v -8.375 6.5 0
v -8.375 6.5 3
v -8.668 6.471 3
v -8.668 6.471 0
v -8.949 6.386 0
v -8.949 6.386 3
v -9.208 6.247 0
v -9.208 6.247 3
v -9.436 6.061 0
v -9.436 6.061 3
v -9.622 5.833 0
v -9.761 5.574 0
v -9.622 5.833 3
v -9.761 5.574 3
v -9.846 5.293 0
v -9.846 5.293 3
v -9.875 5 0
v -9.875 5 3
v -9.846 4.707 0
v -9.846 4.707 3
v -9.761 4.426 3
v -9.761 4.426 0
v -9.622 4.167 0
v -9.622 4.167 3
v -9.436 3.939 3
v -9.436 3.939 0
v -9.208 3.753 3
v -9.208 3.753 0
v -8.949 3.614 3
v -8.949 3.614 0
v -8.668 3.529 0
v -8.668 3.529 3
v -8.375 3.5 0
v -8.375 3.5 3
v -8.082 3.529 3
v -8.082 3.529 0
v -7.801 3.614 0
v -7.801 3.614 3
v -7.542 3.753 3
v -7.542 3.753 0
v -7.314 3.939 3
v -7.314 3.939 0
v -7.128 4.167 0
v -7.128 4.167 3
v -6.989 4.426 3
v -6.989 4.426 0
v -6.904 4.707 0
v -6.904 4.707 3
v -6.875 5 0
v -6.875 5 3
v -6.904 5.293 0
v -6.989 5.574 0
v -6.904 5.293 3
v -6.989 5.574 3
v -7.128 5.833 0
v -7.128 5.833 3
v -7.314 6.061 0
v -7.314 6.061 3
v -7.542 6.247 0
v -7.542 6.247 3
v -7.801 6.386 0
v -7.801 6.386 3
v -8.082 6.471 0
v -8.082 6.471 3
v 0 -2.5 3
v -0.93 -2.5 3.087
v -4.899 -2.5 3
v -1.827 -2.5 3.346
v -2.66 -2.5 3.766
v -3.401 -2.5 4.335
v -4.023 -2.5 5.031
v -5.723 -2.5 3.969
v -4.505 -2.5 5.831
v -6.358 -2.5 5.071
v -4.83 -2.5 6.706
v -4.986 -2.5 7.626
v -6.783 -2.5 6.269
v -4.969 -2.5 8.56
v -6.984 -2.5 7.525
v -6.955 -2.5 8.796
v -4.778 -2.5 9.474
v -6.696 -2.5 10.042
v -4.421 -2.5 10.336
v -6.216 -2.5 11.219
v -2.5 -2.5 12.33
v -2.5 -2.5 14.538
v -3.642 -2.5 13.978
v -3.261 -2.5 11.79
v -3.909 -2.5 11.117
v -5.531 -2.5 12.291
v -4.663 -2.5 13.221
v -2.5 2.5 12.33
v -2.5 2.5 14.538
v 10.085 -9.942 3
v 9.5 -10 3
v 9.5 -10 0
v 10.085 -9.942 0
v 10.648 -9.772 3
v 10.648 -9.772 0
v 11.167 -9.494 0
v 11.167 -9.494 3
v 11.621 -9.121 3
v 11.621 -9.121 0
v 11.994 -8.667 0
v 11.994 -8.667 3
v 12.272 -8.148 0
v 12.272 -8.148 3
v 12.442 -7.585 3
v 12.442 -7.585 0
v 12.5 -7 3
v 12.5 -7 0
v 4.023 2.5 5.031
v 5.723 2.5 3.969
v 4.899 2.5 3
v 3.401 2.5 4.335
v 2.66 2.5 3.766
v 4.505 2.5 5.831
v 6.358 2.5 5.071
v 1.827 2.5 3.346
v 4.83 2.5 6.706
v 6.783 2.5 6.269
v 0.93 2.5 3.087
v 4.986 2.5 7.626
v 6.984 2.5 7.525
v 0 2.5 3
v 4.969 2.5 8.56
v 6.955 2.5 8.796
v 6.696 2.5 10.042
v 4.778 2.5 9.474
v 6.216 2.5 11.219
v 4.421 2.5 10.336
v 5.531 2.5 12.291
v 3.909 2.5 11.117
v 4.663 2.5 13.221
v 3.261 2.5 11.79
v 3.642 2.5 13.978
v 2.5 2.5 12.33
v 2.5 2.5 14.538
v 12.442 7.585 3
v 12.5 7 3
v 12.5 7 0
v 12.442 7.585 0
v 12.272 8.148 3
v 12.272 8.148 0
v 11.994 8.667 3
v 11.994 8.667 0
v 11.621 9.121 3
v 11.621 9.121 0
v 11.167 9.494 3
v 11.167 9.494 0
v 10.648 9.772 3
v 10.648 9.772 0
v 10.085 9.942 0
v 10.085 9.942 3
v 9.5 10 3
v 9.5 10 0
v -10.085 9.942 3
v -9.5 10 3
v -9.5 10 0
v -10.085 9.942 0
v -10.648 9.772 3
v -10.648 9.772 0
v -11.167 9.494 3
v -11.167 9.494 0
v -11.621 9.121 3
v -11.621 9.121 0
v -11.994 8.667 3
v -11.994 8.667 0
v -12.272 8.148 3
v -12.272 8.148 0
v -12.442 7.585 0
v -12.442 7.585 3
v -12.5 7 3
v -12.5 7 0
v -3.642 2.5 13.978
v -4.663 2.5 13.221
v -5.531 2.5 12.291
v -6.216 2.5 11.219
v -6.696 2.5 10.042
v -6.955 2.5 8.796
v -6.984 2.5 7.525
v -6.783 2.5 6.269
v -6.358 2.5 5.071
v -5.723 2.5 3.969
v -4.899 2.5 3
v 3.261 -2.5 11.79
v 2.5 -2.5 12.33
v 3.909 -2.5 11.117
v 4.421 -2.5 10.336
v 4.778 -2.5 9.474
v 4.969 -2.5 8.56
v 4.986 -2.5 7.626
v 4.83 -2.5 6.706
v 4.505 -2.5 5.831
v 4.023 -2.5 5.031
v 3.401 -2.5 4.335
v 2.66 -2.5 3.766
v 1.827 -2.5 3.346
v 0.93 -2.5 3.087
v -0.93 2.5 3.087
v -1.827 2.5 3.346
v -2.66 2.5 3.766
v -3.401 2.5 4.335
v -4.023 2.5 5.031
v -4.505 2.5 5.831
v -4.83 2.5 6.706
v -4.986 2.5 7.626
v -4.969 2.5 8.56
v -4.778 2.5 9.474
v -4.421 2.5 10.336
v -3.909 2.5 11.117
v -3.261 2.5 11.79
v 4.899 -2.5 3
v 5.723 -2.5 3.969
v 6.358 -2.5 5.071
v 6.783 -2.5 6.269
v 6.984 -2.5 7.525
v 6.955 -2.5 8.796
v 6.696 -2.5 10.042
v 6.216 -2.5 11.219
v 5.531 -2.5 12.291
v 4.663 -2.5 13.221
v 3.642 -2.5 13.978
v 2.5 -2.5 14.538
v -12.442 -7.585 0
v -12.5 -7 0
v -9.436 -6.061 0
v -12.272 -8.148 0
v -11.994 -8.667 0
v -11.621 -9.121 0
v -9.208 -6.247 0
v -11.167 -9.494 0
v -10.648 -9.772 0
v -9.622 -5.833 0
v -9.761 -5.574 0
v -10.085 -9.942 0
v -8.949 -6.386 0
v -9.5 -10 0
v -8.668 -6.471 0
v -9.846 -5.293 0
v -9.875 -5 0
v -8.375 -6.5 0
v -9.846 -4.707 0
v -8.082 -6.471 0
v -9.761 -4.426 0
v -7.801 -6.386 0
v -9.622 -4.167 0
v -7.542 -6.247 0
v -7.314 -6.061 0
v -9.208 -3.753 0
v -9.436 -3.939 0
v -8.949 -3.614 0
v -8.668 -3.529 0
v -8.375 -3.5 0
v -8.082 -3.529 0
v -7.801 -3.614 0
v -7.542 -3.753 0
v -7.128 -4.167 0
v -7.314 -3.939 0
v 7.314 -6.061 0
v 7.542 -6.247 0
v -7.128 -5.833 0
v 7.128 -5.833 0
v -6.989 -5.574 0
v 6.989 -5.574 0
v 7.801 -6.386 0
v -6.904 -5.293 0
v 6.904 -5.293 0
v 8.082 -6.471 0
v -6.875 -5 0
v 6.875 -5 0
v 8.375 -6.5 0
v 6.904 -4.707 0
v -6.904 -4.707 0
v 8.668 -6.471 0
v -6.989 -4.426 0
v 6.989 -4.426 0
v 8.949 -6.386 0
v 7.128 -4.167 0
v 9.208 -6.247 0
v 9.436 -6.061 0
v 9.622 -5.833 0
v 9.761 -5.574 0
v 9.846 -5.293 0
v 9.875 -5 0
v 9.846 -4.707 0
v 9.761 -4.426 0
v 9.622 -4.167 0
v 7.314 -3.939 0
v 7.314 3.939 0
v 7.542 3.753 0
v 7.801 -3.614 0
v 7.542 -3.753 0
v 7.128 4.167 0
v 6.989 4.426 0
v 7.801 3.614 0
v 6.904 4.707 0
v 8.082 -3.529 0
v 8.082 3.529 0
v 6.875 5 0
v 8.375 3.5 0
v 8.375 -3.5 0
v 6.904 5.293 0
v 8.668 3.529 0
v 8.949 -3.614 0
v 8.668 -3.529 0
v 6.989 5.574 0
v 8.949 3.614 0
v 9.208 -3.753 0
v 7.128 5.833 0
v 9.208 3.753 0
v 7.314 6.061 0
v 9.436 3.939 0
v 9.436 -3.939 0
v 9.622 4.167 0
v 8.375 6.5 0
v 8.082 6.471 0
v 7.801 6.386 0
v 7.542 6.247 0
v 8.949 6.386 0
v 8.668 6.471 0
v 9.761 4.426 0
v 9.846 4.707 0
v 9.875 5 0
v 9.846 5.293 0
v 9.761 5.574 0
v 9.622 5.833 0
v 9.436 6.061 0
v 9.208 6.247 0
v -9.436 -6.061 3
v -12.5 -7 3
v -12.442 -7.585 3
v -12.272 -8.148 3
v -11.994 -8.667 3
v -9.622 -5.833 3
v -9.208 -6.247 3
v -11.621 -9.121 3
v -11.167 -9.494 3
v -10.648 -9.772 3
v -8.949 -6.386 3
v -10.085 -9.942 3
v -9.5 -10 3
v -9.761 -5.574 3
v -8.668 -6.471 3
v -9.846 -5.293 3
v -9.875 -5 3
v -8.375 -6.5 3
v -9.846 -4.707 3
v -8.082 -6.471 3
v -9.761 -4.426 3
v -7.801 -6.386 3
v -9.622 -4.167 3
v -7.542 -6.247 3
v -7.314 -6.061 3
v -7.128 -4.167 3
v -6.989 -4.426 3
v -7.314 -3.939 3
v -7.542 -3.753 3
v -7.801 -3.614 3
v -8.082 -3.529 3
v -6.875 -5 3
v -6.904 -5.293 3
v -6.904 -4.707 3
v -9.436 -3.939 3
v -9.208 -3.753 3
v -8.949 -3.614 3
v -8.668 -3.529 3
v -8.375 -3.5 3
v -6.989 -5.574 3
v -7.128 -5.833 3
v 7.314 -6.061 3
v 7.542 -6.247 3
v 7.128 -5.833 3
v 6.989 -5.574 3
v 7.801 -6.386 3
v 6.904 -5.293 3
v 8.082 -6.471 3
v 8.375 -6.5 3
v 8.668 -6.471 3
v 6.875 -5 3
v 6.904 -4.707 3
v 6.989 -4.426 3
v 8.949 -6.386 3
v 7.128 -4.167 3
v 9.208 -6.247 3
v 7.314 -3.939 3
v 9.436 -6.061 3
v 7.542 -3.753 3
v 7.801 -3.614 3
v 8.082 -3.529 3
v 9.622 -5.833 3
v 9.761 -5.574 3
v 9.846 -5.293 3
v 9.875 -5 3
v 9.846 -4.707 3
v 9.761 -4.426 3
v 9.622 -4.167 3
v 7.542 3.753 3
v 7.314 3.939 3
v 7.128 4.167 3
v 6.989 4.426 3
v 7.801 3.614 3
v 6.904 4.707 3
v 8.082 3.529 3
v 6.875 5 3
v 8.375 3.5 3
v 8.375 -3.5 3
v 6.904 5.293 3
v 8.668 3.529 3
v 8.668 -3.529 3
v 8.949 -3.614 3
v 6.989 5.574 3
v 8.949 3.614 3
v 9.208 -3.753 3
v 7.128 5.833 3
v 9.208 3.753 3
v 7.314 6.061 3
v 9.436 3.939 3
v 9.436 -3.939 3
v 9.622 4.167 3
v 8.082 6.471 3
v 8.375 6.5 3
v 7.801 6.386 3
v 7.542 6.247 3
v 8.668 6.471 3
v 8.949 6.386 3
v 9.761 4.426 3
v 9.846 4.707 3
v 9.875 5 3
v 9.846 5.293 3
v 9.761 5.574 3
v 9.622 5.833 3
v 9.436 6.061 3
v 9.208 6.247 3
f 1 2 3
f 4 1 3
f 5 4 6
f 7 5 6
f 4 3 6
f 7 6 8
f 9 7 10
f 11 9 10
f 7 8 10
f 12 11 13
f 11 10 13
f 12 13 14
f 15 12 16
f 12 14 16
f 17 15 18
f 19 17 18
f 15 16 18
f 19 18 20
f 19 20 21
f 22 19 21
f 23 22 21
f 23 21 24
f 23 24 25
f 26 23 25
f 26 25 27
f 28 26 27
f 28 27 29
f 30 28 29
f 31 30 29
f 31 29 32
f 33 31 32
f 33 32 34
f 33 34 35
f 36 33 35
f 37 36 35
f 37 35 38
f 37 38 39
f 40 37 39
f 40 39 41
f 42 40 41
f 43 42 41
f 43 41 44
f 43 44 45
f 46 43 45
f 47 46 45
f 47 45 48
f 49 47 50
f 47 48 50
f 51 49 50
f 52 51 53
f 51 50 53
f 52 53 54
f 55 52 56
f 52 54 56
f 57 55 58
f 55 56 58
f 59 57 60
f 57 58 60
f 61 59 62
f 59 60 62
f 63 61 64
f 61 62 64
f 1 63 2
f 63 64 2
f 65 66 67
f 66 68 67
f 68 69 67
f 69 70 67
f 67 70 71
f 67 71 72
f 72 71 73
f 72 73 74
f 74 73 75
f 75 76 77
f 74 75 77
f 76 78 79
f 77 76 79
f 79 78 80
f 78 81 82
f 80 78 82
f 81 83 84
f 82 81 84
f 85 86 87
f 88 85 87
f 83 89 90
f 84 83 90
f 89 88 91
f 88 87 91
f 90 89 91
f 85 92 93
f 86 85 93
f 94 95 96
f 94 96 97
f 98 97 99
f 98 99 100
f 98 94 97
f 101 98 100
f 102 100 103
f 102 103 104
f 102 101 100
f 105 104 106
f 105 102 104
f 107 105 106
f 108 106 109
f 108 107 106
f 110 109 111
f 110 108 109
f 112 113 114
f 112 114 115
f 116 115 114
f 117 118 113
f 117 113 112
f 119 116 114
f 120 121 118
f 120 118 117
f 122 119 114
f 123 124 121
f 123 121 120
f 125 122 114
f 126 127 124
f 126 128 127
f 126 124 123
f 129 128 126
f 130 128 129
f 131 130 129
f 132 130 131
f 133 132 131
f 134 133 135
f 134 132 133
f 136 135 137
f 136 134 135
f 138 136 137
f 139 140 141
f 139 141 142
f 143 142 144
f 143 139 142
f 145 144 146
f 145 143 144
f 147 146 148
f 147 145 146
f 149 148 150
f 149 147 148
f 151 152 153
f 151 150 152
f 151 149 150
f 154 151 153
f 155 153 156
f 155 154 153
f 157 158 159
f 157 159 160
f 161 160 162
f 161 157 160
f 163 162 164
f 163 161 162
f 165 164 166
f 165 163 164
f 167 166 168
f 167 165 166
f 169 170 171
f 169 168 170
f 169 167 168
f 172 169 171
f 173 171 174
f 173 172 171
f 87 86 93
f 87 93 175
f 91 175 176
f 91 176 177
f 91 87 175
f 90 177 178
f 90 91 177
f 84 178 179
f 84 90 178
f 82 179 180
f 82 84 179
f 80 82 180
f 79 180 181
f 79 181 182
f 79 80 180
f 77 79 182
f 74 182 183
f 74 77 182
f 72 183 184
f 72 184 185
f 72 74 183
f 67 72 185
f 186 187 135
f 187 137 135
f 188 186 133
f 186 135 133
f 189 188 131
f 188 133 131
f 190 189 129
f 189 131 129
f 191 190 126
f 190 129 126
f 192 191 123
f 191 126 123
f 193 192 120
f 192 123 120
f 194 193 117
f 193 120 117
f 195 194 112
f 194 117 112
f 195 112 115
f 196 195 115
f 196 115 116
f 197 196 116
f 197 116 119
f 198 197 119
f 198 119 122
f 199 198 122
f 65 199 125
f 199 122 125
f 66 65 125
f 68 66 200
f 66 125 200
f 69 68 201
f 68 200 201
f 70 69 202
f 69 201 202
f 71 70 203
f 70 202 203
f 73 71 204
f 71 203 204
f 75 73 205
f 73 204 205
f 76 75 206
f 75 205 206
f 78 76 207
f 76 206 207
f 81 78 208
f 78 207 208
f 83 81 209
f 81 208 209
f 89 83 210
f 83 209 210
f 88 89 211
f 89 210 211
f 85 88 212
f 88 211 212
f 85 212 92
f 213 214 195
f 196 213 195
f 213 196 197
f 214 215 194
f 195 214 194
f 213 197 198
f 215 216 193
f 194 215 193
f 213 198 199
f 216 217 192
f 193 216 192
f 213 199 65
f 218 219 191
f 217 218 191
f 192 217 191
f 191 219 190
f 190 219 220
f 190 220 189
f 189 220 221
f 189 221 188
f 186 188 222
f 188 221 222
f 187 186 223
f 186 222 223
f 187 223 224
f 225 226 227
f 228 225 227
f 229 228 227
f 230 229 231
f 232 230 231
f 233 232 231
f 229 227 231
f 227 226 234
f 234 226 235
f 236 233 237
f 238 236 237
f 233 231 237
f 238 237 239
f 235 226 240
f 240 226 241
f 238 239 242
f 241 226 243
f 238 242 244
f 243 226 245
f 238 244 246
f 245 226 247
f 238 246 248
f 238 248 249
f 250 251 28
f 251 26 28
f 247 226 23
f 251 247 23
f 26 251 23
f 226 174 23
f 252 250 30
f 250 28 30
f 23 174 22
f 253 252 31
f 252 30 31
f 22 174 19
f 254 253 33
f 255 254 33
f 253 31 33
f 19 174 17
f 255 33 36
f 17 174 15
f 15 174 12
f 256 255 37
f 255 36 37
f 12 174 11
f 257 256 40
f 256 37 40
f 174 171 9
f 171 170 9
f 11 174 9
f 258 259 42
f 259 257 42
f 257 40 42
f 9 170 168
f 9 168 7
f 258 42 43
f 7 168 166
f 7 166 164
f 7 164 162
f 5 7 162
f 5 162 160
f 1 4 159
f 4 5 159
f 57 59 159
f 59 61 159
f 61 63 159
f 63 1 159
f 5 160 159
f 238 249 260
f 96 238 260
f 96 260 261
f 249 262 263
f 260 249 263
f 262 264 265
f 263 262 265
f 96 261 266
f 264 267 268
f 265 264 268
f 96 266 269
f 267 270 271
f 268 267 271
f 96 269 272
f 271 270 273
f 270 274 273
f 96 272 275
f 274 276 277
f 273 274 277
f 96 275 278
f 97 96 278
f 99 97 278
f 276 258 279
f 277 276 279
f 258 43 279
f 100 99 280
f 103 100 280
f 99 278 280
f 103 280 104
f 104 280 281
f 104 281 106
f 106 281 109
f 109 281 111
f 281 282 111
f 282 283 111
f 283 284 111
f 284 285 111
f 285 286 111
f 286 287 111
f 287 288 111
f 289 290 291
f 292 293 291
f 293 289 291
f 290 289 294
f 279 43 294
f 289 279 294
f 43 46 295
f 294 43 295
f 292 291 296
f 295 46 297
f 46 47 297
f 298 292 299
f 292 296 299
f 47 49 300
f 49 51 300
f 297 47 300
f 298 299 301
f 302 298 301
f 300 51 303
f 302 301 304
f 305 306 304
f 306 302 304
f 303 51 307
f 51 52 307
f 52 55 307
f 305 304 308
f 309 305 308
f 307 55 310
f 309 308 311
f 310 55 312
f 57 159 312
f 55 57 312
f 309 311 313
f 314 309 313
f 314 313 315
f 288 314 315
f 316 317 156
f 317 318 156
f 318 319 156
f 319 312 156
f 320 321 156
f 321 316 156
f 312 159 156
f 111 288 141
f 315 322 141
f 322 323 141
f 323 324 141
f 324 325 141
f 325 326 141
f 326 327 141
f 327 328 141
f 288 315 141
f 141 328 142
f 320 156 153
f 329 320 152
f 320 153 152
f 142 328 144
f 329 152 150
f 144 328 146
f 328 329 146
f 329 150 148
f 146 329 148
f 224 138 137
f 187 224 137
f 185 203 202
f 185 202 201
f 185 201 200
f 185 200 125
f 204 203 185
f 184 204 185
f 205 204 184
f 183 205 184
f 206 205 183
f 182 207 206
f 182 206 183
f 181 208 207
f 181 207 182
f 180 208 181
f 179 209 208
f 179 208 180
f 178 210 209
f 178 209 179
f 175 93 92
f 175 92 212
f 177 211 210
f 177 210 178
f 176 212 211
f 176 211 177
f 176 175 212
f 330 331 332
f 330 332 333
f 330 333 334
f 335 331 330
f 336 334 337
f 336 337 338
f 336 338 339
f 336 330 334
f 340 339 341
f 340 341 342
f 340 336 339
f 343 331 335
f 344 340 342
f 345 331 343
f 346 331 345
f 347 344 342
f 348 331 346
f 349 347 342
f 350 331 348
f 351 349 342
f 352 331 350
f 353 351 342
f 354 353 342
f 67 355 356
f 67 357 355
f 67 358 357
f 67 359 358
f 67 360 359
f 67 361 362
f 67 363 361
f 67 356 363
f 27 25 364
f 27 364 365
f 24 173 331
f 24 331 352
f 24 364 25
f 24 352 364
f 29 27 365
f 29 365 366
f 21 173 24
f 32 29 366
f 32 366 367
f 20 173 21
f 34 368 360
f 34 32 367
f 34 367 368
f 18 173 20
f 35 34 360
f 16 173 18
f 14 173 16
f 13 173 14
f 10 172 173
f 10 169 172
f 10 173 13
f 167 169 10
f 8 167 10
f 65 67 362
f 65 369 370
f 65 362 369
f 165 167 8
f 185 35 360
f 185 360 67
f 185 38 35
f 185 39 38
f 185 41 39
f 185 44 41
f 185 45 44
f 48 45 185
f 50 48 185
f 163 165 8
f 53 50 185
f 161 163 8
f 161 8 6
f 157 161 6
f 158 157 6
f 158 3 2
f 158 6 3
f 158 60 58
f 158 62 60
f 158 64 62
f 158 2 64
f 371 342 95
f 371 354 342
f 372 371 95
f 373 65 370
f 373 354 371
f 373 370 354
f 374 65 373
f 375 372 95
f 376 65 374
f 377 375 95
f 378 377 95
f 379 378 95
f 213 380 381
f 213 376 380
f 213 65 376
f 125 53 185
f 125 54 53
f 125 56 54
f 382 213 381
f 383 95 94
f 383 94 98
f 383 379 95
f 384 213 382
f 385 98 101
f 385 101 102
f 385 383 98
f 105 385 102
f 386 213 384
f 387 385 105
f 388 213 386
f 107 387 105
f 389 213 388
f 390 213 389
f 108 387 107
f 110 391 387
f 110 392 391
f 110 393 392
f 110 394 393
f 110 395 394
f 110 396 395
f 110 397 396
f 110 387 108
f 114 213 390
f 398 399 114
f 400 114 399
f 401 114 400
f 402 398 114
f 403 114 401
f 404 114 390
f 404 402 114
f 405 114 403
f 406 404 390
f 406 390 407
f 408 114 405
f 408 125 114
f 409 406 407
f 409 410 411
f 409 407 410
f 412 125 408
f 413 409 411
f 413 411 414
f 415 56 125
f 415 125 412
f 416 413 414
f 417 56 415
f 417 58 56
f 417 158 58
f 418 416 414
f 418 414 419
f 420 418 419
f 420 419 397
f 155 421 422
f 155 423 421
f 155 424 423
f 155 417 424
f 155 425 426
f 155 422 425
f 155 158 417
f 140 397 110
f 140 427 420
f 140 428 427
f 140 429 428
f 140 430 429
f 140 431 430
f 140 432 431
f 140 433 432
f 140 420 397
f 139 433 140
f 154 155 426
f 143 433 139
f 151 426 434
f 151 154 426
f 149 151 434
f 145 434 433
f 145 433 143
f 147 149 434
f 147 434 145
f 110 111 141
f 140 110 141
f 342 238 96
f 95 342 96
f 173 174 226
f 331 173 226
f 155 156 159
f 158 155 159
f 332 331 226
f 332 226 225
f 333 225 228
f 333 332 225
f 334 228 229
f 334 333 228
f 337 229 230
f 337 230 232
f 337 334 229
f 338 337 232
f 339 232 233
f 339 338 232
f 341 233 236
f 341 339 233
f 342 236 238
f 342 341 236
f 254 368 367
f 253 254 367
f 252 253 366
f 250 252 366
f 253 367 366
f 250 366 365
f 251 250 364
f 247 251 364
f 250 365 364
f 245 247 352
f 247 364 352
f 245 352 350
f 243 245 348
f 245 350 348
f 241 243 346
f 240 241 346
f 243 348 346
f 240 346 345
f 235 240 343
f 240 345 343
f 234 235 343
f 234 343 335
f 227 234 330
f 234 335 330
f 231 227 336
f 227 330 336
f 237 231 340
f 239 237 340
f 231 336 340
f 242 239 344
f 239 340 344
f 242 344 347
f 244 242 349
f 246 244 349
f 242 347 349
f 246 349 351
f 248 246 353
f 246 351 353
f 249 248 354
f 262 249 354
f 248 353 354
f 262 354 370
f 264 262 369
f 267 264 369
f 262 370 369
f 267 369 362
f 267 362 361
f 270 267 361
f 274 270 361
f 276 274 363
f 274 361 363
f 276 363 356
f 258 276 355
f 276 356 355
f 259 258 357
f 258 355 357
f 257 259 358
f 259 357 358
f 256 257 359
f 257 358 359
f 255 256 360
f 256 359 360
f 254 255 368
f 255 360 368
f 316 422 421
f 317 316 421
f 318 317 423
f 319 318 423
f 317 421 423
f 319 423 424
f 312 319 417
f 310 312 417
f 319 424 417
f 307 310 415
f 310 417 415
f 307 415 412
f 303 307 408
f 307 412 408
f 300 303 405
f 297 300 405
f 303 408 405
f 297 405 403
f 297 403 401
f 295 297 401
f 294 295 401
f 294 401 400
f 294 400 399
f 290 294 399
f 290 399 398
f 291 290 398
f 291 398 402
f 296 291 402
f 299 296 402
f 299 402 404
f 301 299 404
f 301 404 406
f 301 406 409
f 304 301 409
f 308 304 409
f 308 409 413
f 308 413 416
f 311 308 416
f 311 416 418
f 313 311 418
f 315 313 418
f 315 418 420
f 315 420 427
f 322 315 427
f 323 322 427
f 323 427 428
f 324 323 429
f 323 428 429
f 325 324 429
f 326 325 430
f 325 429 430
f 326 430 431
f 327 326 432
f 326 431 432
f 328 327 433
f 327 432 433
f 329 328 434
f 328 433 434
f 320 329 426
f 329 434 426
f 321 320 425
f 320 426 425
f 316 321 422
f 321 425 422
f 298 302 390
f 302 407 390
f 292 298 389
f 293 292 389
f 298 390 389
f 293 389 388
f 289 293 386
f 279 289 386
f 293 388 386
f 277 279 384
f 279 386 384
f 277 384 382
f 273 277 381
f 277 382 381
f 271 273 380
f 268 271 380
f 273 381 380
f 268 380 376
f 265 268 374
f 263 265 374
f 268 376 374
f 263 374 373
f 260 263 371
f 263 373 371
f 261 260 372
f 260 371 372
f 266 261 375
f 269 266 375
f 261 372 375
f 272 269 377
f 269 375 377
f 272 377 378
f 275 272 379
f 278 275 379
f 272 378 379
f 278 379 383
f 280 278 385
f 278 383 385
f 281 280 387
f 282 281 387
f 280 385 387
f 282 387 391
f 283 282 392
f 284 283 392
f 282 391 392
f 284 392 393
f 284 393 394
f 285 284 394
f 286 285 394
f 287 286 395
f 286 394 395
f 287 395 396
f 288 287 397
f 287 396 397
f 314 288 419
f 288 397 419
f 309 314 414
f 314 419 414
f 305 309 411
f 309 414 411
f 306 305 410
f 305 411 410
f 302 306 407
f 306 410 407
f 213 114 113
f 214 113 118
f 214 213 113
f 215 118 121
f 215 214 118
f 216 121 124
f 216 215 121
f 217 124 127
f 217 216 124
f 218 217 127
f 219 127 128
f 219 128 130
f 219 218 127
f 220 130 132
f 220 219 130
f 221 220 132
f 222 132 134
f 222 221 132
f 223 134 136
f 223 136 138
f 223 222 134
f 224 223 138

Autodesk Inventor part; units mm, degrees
ref_plane "YZ Plane" through (0, 0, 0) normal (1, 0, 0) x (0, 1, 0)
ref_plane "XZ Plane" through (0, 0, 0) normal (0, 1, 0) x (-1, 0, 0)
ref_plane "XY Plane" through (0, 0, 0) normal (0, 0, 1) x (1, 0, 0)
sketch "Szkic1" plane through (0, 0, 0) normal (0, 0, 1) x (1, 0, 0)
  line L0 (-12.5, -10) -> (12.5, -10)
  line L1 (12.5, -10) -> (12.5, 10)
  line L2 (12.5, 10) -> (-12.5, 10)
  line L3 (-12.5, 10) -> (-12.5, -10)
  line L4 (-12.5, -10) -> (12.5, 10) construction
  line L5 (12.5, -10) -> (-12.5, 10) construction
  point P0 (0, 0)
  dimension "d0" = 25
  dimension "d1" = 20
extrude "Wyciągnięcie proste1" add sketch "Szkic1" along normal blind 3
sketch "Szkic2" plane through (0, 0, 0) normal (0, 1, 0) x (-1, 0, 0)
  circle A0 centre (0, 8) radius 7
  line L0 (12.5, 3) -> (-12.5, 3) projected
  line L1 (12.5, 0) -> (-12.5, 0) projected
  circle A1 centre (0, 8) radius 5
  line L2 (4.899, 3) -> (-4.899, 3)
  point P0 (0, 0)
  point P1 (0, 0)
  dimension "d4" = 14
  dimension "d5" = 10
extrude "Wyciągnięcie proste2" add sketch "Szkic2" along normal mid plane 5 contours A0 L0 picked at (6.263, 8.5684)
sketch "Szkic3" plane through (-12.5, 10, 0) normal (0, 1, 0) x (1, 0, 0)
  line L0 (10, -16) -> (15, -16)
  line L1 (15, -16) -> (15, -12)
  line L2 (15, -12) -> (10, -12)
  line L3 (10, -12) -> (10, -16)
  line L4 (10, -16) -> (15, -12) construction
  line L5 (15, -16) -> (10, -12) construction
  circle A0 centre (12.5, -8) radius 5 projected
  line L6 (25, 0) -> (0, 0) projected
  point P0 (12.5, 0)
  point P1 (12.5, -14)
  point P2 (12.5, -14)
  point P3 (12.5, 0)
  dimension "d8" = 5
  dimension "d9" = 4
  dimension "d10" = 6
extrude "Wyciągnięcie proste3" cut sketch "Szkic3" against normal blind 20 contours L3 A0 L1 L0 | L3 L2 L1 A0 picked at (12.3258, -12.3242)
sketch "Szkic5" plane through (0, 0, 0) normal (0, 0, -1) x (-1, 0, 0)
  line L0 (12.5, 10) -> (12.5, -10) projected
  line L1 (-12.5, 10) -> (12.5, 10) projected
  line L2 (-12.5, -10) -> (-12.5, 10) projected
  line L3 (-12.5, 0) -> (12.5, 0) construction
  line L4 (0, 10) -> (0, -10) construction
  line L5 (12.5, -10) -> (-12.5, -10) projected
  point P0 (0, 0)
  point P1 (8.375, 5)
  point P2 (8.375, -5)
  point P3 (-8.375, 5)
  point P4 (-8.375, -5)
  dimension "d22" = 4.125
  dimension "d23" = 5
hole "Otwór2" at (-8.375, 5, 0) at (-8.375, -5, 0) at (8.375, 5, 0) at (8.375, -5, 0) direction (0, 0, 1) diameter 3 end through all
fillet "Zaokrąglenie1" radius 3 4 edges at (-12.5, -10, 1.5) (-12.5, 10, 1.5) (12.5, 10, 1.5) (12.5, -10, 1.5)
properties part number "uchwyt_przewody"
